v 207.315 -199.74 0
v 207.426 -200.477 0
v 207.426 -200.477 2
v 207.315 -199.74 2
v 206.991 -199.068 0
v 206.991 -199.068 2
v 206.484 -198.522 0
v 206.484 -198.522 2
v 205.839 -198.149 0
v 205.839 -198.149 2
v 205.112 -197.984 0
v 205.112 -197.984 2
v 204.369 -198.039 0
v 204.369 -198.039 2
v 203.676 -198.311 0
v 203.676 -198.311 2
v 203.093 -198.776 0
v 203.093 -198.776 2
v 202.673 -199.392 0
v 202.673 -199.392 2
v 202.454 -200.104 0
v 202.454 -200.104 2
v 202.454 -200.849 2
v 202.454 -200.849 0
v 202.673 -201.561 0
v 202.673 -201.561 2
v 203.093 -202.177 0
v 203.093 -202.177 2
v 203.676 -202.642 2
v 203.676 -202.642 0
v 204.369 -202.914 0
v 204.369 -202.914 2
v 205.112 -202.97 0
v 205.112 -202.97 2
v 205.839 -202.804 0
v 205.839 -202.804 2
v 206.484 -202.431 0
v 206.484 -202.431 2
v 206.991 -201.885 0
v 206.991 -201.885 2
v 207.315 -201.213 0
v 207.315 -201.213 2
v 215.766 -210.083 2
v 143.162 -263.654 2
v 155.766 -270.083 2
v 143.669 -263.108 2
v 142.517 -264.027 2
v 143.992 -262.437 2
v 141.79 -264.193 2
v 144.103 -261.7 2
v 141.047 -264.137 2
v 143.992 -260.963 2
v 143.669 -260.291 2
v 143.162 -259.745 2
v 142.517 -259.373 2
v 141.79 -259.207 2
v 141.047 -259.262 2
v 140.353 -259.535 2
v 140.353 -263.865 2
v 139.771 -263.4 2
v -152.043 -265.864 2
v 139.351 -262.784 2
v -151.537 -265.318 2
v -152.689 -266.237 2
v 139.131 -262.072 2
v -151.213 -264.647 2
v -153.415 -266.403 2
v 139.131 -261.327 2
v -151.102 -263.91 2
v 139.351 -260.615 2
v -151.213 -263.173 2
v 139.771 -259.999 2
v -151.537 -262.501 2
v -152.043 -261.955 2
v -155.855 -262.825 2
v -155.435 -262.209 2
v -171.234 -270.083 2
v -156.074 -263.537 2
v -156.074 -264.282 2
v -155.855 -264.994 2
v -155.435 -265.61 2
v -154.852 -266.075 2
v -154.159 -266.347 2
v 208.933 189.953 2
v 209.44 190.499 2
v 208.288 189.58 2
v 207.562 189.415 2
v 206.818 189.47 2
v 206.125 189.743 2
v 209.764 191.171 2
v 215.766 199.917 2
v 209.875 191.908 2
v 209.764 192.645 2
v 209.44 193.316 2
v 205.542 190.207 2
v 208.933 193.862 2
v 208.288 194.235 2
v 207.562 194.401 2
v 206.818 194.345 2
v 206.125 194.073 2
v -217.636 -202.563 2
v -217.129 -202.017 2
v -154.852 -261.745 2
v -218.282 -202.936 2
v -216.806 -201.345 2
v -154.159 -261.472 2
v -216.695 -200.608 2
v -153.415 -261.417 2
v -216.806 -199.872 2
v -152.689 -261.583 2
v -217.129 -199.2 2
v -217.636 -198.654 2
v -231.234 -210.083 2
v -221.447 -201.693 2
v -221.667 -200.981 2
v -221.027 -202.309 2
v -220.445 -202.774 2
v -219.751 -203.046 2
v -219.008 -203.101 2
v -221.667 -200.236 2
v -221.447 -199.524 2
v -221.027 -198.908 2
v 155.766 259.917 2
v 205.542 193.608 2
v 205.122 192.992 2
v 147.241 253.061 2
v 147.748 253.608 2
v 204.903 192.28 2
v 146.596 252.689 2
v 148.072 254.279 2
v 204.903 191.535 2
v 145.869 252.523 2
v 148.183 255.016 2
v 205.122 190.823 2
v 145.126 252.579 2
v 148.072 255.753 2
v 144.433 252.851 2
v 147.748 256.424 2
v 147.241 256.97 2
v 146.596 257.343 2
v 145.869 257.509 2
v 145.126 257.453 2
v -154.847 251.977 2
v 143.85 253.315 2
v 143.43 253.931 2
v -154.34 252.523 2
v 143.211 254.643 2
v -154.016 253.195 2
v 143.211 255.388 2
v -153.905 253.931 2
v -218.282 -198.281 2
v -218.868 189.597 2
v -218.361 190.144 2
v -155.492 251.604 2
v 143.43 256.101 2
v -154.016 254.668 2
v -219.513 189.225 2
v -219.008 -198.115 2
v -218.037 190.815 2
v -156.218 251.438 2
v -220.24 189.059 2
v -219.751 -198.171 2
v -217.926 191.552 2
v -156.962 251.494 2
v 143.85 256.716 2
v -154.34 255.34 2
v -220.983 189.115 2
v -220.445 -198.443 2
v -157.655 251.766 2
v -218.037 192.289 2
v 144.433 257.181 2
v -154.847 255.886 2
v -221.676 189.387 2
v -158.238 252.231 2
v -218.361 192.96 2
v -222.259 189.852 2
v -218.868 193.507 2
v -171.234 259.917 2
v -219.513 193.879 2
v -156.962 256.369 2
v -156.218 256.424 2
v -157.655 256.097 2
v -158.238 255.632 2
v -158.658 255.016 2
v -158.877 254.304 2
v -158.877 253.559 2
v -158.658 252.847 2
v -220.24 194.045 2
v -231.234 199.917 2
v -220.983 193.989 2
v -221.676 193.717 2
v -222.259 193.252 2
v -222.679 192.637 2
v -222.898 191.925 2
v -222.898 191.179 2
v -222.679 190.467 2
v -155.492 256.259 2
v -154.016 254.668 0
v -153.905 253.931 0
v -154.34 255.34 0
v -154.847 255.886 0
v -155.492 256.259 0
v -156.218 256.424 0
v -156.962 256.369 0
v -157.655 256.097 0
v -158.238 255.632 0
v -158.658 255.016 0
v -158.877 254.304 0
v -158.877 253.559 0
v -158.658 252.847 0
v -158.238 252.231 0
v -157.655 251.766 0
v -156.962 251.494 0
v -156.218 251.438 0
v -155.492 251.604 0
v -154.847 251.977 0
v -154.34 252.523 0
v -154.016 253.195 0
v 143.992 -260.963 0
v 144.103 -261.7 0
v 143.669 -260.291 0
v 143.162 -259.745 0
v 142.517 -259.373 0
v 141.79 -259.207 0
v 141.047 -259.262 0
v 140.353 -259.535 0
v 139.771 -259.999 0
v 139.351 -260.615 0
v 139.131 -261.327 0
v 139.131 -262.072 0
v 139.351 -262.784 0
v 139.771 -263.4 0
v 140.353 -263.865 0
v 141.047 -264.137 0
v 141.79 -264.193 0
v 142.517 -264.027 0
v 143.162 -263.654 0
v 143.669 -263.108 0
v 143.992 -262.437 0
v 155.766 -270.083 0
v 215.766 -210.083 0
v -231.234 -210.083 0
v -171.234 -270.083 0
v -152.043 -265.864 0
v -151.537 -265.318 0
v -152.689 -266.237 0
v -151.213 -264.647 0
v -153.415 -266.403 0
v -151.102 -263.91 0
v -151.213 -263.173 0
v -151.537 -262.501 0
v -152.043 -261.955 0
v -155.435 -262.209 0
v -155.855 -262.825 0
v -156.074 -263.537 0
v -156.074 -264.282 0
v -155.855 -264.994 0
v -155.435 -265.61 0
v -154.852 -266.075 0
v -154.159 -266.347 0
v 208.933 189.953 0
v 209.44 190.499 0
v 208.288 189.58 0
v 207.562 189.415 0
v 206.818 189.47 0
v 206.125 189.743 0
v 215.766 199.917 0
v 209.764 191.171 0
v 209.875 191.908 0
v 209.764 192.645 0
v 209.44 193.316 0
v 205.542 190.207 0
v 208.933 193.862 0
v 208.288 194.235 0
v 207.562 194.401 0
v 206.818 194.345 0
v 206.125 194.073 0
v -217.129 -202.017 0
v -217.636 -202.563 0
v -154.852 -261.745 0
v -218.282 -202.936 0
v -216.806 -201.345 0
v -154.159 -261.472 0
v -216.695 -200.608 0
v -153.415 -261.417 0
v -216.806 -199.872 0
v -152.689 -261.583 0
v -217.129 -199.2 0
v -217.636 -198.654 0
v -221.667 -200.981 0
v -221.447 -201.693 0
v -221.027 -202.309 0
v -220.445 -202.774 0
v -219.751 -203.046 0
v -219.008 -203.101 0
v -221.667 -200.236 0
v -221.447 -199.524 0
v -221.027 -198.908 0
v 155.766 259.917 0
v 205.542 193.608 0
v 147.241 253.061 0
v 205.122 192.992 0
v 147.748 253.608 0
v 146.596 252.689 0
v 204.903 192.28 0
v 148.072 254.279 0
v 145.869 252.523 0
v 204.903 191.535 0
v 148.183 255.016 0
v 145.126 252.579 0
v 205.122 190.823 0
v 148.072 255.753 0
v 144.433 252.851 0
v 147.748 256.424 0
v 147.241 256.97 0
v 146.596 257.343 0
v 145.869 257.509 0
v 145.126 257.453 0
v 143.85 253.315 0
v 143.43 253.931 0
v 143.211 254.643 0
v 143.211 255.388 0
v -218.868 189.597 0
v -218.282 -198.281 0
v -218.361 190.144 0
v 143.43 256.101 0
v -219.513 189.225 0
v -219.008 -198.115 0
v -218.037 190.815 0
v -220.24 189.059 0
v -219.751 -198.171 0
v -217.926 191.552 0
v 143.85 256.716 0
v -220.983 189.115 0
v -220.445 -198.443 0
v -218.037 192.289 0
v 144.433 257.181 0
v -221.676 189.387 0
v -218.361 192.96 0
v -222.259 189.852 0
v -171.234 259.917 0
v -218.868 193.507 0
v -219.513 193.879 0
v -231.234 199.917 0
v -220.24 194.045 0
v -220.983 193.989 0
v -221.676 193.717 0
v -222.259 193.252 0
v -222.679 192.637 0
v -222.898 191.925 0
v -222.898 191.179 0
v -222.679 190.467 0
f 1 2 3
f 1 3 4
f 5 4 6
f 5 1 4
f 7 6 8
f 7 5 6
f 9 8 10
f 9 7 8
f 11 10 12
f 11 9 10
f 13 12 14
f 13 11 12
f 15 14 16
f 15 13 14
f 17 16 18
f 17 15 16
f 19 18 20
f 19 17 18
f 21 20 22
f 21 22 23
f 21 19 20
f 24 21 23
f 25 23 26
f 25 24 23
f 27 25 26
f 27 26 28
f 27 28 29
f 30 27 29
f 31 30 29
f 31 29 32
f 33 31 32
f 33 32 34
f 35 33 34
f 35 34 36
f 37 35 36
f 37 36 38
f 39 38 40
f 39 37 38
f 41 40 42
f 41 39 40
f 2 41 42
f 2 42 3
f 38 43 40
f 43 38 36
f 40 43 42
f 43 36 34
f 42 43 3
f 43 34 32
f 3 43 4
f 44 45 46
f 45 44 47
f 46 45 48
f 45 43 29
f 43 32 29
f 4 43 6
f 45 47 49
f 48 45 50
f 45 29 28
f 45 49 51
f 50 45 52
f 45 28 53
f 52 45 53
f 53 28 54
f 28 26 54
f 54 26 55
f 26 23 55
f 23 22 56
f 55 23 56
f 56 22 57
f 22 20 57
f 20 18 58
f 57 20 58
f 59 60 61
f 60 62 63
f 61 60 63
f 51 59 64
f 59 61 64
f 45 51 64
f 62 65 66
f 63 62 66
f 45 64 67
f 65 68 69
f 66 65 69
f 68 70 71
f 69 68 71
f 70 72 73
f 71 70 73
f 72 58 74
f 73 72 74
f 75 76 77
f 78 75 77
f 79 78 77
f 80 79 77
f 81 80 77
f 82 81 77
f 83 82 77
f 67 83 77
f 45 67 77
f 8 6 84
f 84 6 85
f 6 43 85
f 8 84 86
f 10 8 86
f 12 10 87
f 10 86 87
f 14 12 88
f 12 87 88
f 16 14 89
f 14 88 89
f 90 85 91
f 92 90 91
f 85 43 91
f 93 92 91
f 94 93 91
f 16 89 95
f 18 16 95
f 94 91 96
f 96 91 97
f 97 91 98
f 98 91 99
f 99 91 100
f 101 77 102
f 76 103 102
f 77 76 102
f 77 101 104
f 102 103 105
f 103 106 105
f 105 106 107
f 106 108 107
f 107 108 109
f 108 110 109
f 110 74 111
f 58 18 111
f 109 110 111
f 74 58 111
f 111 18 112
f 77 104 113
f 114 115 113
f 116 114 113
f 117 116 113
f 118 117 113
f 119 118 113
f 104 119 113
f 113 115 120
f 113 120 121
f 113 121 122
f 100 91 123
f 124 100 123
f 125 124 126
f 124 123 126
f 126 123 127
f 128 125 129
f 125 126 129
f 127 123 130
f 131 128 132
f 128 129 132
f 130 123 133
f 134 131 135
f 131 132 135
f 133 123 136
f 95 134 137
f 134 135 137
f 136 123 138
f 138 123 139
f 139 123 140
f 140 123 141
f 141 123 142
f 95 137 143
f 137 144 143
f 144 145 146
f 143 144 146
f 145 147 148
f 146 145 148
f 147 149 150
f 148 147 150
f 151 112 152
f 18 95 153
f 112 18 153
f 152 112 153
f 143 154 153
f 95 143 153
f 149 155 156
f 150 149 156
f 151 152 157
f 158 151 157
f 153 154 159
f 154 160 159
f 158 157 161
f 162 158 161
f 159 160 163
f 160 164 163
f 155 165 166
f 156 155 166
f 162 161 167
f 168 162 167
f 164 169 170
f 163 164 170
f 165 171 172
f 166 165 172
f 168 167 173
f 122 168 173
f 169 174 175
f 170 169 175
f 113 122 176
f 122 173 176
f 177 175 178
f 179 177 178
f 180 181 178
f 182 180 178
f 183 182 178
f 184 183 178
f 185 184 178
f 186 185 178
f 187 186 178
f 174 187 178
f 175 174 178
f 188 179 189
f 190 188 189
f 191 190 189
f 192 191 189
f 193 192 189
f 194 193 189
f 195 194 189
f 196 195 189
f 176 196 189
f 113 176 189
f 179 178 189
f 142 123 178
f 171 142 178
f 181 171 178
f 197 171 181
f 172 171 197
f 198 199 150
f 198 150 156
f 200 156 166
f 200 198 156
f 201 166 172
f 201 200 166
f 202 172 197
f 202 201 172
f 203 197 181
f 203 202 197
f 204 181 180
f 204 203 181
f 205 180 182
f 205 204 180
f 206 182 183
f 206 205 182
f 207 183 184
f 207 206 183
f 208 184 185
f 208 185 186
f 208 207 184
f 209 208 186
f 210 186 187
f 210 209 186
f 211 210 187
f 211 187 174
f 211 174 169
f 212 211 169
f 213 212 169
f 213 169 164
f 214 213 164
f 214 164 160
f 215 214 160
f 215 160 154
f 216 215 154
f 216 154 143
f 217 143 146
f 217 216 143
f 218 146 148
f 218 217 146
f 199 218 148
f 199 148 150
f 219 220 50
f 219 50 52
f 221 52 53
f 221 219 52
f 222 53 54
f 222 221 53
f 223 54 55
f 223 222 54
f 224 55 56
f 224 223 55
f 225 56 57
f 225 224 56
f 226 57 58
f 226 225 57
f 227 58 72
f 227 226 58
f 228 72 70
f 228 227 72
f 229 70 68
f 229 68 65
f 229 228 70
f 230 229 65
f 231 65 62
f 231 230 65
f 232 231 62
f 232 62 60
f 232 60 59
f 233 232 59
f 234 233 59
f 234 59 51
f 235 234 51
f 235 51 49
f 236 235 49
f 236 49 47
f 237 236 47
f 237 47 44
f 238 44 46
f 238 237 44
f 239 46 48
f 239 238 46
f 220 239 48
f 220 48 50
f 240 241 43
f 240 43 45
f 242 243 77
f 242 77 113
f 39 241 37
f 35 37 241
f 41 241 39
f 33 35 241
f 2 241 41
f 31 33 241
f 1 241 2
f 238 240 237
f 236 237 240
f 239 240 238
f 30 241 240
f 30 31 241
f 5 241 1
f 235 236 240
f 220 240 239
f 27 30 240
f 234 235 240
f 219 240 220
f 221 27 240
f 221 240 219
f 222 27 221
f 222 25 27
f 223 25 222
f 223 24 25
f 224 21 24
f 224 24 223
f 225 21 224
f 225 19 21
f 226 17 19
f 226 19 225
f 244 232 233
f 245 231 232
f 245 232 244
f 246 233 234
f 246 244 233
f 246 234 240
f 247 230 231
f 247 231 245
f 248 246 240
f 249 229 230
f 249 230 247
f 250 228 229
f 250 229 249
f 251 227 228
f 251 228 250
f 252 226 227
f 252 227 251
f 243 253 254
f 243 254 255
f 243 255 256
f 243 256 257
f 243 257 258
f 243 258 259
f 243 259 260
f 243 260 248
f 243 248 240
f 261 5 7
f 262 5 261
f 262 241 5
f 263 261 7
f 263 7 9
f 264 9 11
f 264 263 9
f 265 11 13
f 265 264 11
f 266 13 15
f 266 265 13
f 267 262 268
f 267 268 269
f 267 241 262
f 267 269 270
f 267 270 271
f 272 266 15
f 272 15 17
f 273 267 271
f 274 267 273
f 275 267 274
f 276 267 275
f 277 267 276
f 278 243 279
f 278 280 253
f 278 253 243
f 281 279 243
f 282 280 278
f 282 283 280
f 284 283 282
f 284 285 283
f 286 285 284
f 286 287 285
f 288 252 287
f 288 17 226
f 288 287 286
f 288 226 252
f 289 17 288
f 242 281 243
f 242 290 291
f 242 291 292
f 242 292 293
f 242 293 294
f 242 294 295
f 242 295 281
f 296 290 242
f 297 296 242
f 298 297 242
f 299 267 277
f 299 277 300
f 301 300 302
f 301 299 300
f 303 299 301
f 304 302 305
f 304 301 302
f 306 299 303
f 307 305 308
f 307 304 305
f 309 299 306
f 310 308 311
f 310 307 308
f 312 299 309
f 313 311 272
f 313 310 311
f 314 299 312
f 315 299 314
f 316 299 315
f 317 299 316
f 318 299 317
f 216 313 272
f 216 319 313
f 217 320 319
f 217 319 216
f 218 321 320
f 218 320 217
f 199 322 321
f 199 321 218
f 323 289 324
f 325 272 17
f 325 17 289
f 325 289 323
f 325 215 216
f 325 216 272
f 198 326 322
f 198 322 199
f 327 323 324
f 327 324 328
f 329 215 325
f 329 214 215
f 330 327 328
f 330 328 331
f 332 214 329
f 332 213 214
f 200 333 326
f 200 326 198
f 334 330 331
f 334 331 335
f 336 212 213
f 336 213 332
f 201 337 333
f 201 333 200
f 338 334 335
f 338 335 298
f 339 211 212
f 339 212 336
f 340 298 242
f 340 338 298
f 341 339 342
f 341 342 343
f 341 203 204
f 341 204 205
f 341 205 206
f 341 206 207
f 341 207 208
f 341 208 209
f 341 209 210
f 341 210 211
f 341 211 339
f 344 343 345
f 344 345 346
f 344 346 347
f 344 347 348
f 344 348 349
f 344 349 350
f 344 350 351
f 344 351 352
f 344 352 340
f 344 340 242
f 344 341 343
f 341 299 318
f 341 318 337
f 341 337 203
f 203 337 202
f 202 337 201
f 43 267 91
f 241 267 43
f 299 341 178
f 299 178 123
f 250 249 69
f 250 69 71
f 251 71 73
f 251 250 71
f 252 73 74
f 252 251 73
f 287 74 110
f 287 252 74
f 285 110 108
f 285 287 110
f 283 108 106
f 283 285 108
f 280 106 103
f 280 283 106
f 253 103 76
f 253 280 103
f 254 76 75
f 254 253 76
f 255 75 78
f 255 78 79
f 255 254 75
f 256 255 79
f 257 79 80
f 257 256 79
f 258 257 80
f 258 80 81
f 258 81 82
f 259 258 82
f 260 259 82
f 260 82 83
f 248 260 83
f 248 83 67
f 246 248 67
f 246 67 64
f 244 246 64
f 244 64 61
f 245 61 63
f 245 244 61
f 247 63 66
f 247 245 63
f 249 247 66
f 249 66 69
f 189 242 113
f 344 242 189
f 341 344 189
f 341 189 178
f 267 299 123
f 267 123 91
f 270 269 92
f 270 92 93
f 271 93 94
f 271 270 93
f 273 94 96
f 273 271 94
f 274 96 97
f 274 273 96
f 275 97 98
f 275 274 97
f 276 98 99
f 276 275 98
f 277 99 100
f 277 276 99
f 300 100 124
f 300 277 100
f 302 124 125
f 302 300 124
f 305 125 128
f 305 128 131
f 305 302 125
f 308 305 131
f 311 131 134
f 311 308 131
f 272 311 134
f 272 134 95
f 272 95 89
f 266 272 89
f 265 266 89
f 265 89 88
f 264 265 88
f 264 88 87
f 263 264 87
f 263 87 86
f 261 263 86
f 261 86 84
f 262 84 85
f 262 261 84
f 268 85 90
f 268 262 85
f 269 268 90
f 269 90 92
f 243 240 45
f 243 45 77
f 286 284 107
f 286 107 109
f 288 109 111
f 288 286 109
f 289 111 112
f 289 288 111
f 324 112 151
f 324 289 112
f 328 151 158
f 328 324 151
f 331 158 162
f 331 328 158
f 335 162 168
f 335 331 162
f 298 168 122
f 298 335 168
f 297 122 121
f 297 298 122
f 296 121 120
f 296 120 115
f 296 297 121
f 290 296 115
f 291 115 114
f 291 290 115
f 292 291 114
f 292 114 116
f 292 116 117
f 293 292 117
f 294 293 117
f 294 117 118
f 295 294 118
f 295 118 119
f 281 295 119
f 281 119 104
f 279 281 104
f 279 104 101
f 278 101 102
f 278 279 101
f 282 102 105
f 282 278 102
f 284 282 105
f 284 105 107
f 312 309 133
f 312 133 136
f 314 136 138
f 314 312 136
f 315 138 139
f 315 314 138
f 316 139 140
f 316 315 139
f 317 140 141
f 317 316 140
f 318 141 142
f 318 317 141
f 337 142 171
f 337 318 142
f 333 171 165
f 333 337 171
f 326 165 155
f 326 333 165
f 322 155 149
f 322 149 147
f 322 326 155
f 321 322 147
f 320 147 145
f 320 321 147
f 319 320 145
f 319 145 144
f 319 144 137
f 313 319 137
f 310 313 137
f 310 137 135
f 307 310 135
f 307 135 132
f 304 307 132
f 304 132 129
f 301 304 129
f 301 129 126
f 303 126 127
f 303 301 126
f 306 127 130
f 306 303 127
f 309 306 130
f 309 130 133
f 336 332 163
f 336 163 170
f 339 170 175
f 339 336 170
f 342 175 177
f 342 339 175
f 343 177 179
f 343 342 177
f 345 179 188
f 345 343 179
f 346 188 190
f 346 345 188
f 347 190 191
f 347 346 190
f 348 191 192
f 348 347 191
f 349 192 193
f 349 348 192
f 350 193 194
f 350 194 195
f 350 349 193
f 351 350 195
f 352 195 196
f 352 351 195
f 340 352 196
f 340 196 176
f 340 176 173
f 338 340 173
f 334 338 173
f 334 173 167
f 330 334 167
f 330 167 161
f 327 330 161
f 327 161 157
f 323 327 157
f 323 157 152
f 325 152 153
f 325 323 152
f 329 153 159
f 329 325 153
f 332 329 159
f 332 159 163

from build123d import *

# Parameters (mm, degrees)
SKETCH_R  = 2.5
PAD_DEPTH = 2


with BuildPart() as part:
    # Sketch → Pad (new body)
    with BuildSketch(Plane.XY):
        Polygon((-171.233897, 259.917405), (155.766103, 259.917405), (215.766103, 199.917405), (215.766103, -210.082595), (155.766103, -270.082595), (-171.233897, -270.082595), (-231.233897, -210.082595), (-231.233897, 199.917405), align=None)
        with Locations((-220.426407, 191.551941)):
            Circle(SKETCH_R, mode=Mode.SUBTRACT)
        with Locations((-156.405304, 253.931473)):
            Circle(SKETCH_R, mode=Mode.SUBTRACT)
        with Locations((145.682602, 255.015823)):
            Circle(SKETCH_R, mode=Mode.SUBTRACT)
        with Locations((-219.194855, -200.60849)):
            Circle(SKETCH_R, mode=Mode.SUBTRACT)
        with Locations((-153.602219, -263.909698)):
            Circle(SKETCH_R, mode=Mode.SUBTRACT)
        with Locations((141.603378, -261.699738)):
            Circle(SKETCH_R, mode=Mode.SUBTRACT)
        with Locations((204.925644, -200.476547)):
            Circle(SKETCH_R, mode=Mode.SUBTRACT)
        with Locations((207.374741, 191.907639)):
            Circle(SKETCH_R, mode=Mode.SUBTRACT)
    extrude(amount=PAD_DEPTH)


solid = part.part
